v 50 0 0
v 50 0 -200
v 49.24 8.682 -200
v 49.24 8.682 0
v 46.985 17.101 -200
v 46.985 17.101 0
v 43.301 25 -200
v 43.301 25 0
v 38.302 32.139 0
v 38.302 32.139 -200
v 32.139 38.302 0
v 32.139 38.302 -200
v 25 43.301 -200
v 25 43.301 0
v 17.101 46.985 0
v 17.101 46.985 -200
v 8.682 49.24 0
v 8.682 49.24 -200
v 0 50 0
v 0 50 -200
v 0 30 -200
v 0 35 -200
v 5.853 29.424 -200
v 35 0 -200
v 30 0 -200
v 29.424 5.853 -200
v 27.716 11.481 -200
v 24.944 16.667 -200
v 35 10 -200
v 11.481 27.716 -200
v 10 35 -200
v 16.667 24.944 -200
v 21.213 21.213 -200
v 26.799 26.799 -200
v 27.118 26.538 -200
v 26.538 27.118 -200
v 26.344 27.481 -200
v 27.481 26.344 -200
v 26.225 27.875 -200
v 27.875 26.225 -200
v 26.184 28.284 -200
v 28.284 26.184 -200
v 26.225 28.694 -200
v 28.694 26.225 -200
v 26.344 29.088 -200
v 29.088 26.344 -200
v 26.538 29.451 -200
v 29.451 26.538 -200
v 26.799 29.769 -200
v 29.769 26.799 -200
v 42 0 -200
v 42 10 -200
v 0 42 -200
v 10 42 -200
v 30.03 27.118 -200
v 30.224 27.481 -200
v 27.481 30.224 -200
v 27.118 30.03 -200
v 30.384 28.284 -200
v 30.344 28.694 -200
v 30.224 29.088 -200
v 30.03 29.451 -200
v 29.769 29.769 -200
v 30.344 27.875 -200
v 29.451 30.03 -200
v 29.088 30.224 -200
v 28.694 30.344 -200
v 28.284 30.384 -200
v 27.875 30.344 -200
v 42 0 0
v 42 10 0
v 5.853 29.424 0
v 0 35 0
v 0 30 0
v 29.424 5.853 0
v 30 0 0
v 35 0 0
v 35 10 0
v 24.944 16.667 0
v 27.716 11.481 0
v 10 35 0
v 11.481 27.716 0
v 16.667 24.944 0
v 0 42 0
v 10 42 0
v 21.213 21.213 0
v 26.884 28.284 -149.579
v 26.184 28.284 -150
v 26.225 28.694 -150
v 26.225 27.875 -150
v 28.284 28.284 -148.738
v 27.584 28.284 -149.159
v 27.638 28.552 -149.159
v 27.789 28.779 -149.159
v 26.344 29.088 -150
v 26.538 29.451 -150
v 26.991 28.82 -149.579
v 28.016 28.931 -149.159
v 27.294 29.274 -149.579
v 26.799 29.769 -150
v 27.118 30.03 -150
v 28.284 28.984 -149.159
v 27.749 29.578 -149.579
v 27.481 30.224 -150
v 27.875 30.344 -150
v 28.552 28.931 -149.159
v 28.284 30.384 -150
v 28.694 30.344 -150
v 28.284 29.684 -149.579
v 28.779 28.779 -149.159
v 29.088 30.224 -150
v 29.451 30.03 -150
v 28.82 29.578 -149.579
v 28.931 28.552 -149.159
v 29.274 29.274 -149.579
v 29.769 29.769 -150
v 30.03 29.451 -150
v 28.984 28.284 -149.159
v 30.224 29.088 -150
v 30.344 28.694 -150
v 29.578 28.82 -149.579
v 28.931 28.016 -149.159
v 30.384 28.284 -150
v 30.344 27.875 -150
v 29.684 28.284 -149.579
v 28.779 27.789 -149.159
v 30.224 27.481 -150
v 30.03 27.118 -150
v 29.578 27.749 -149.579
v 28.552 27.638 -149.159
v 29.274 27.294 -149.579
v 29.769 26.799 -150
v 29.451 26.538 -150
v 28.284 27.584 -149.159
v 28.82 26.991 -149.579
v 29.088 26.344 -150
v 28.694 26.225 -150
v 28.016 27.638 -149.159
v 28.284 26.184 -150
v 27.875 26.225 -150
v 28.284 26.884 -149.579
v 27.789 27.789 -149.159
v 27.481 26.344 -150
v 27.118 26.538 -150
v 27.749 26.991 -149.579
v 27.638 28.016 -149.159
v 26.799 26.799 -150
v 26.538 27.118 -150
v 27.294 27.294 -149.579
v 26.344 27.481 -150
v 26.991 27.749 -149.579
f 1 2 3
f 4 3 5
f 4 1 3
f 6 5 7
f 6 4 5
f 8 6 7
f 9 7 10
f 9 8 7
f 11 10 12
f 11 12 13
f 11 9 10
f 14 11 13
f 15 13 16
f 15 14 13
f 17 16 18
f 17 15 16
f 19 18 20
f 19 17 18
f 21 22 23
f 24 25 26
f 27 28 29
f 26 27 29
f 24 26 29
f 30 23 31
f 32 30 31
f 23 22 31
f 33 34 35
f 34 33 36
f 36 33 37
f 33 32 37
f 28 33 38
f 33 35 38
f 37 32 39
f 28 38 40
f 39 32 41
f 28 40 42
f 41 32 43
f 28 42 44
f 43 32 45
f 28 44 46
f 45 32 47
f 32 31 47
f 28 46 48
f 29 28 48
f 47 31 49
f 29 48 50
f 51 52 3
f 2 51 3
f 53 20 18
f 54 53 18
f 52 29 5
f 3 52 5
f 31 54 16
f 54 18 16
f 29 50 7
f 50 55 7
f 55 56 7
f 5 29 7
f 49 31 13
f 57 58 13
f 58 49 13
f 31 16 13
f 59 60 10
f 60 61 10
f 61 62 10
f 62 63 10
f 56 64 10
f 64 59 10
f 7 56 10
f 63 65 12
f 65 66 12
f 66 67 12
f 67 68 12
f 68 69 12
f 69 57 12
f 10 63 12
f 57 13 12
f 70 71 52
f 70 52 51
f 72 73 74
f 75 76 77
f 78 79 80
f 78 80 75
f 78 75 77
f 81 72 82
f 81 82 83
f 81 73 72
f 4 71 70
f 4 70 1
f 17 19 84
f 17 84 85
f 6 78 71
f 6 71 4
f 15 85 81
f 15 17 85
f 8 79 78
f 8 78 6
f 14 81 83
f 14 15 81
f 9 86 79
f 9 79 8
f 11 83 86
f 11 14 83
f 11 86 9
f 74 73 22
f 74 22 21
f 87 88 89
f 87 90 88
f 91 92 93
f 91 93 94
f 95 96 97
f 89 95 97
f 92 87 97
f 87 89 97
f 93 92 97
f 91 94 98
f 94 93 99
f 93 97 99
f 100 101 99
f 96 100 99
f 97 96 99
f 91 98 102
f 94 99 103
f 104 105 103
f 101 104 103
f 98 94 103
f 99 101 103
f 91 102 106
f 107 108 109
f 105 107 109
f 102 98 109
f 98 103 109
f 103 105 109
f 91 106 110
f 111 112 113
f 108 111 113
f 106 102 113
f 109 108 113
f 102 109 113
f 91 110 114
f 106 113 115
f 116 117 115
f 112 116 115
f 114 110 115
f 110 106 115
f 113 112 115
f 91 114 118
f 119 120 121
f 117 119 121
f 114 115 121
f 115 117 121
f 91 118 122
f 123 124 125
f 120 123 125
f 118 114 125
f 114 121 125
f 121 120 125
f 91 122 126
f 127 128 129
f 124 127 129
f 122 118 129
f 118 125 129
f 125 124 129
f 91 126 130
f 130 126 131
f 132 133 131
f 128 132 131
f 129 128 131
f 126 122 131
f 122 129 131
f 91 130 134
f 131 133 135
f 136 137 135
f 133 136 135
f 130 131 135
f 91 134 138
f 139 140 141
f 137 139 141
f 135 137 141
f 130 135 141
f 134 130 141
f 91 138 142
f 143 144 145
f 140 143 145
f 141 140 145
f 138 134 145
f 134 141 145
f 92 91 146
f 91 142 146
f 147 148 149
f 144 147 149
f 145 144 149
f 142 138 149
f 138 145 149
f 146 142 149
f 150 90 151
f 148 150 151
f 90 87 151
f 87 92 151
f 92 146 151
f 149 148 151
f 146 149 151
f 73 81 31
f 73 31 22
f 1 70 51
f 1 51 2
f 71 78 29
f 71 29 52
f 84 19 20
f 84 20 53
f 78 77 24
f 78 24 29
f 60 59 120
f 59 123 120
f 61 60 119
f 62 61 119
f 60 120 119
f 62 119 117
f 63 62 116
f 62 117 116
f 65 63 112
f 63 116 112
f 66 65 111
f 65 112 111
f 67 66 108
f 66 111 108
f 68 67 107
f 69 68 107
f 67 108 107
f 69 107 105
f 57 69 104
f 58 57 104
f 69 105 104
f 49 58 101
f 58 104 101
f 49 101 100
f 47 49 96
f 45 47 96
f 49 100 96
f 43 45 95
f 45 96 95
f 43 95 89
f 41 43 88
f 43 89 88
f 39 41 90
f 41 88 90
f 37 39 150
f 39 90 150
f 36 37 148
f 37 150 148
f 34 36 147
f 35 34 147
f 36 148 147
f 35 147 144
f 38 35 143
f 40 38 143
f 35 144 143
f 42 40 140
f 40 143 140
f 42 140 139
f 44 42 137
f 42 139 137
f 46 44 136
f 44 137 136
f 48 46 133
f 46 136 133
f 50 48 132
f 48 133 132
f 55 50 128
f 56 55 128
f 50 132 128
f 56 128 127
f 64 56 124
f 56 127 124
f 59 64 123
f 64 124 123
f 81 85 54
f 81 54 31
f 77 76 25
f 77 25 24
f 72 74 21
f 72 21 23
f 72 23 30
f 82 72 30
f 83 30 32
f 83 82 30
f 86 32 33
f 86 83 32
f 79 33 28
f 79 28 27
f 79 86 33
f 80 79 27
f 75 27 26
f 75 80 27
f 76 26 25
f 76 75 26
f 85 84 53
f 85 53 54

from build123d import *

# Parameters (mm, degrees)
BOSS_EXTRU_1_DEPTH     = 200
D_GAGEMENT_M3_52_D     = 4.2
D_GAGEMENT_M3_52_DEPTH = 50
D_GAGEMENT_M3_52_TIP   = 1.2618073


with BuildPart() as part:
    # Esquisse2 → Boss.-Extru.1 (new body)
    with BuildSketch(Plane.XY):
        with BuildLine():
            Line((30, 0), (35, 0))
            Line((35, 0), (35, 10))
            Line((35, 10), (42, 10))
            Line((42, 10), (42, 0))
            Line((42, 0), (50, 0))
            ThreePointArc((50, 0), (35.355339059, 35.355339059), (0, 50))
            Line((0, 50), (0, 42))
            Line((0, 42), (10, 42))
            Line((10, 42), (10, 35))
            Line((10, 35), (0, 35))
            Line((0, 35), (0, 30))
            ThreePointArc((0, 30), (21.213203436, 21.213203436), (30, 0))
        make_face()
    extrude(amount=-BOSS_EXTRU_1_DEPTH)

    # Dégagement M3.52
    with Locations(Plane(origin=(0, 0, -200), x_dir=(-1, 0, 0), z_dir=(0, 0, -1))):
        with Locations((-28.284271247, 28.284271247)):
            Hole(D_GAGEMENT_M3_52_D / 2, depth=D_GAGEMENT_M3_52_DEPTH)
            with Locations((0, 0, -(D_GAGEMENT_M3_52_DEPTH + D_GAGEMENT_M3_52_TIP / 2))):  # 118° drill point
                Cone(0, D_GAGEMENT_M3_52_D / 2, D_GAGEMENT_M3_52_TIP, mode=Mode.SUBTRACT)


solid = part.part
